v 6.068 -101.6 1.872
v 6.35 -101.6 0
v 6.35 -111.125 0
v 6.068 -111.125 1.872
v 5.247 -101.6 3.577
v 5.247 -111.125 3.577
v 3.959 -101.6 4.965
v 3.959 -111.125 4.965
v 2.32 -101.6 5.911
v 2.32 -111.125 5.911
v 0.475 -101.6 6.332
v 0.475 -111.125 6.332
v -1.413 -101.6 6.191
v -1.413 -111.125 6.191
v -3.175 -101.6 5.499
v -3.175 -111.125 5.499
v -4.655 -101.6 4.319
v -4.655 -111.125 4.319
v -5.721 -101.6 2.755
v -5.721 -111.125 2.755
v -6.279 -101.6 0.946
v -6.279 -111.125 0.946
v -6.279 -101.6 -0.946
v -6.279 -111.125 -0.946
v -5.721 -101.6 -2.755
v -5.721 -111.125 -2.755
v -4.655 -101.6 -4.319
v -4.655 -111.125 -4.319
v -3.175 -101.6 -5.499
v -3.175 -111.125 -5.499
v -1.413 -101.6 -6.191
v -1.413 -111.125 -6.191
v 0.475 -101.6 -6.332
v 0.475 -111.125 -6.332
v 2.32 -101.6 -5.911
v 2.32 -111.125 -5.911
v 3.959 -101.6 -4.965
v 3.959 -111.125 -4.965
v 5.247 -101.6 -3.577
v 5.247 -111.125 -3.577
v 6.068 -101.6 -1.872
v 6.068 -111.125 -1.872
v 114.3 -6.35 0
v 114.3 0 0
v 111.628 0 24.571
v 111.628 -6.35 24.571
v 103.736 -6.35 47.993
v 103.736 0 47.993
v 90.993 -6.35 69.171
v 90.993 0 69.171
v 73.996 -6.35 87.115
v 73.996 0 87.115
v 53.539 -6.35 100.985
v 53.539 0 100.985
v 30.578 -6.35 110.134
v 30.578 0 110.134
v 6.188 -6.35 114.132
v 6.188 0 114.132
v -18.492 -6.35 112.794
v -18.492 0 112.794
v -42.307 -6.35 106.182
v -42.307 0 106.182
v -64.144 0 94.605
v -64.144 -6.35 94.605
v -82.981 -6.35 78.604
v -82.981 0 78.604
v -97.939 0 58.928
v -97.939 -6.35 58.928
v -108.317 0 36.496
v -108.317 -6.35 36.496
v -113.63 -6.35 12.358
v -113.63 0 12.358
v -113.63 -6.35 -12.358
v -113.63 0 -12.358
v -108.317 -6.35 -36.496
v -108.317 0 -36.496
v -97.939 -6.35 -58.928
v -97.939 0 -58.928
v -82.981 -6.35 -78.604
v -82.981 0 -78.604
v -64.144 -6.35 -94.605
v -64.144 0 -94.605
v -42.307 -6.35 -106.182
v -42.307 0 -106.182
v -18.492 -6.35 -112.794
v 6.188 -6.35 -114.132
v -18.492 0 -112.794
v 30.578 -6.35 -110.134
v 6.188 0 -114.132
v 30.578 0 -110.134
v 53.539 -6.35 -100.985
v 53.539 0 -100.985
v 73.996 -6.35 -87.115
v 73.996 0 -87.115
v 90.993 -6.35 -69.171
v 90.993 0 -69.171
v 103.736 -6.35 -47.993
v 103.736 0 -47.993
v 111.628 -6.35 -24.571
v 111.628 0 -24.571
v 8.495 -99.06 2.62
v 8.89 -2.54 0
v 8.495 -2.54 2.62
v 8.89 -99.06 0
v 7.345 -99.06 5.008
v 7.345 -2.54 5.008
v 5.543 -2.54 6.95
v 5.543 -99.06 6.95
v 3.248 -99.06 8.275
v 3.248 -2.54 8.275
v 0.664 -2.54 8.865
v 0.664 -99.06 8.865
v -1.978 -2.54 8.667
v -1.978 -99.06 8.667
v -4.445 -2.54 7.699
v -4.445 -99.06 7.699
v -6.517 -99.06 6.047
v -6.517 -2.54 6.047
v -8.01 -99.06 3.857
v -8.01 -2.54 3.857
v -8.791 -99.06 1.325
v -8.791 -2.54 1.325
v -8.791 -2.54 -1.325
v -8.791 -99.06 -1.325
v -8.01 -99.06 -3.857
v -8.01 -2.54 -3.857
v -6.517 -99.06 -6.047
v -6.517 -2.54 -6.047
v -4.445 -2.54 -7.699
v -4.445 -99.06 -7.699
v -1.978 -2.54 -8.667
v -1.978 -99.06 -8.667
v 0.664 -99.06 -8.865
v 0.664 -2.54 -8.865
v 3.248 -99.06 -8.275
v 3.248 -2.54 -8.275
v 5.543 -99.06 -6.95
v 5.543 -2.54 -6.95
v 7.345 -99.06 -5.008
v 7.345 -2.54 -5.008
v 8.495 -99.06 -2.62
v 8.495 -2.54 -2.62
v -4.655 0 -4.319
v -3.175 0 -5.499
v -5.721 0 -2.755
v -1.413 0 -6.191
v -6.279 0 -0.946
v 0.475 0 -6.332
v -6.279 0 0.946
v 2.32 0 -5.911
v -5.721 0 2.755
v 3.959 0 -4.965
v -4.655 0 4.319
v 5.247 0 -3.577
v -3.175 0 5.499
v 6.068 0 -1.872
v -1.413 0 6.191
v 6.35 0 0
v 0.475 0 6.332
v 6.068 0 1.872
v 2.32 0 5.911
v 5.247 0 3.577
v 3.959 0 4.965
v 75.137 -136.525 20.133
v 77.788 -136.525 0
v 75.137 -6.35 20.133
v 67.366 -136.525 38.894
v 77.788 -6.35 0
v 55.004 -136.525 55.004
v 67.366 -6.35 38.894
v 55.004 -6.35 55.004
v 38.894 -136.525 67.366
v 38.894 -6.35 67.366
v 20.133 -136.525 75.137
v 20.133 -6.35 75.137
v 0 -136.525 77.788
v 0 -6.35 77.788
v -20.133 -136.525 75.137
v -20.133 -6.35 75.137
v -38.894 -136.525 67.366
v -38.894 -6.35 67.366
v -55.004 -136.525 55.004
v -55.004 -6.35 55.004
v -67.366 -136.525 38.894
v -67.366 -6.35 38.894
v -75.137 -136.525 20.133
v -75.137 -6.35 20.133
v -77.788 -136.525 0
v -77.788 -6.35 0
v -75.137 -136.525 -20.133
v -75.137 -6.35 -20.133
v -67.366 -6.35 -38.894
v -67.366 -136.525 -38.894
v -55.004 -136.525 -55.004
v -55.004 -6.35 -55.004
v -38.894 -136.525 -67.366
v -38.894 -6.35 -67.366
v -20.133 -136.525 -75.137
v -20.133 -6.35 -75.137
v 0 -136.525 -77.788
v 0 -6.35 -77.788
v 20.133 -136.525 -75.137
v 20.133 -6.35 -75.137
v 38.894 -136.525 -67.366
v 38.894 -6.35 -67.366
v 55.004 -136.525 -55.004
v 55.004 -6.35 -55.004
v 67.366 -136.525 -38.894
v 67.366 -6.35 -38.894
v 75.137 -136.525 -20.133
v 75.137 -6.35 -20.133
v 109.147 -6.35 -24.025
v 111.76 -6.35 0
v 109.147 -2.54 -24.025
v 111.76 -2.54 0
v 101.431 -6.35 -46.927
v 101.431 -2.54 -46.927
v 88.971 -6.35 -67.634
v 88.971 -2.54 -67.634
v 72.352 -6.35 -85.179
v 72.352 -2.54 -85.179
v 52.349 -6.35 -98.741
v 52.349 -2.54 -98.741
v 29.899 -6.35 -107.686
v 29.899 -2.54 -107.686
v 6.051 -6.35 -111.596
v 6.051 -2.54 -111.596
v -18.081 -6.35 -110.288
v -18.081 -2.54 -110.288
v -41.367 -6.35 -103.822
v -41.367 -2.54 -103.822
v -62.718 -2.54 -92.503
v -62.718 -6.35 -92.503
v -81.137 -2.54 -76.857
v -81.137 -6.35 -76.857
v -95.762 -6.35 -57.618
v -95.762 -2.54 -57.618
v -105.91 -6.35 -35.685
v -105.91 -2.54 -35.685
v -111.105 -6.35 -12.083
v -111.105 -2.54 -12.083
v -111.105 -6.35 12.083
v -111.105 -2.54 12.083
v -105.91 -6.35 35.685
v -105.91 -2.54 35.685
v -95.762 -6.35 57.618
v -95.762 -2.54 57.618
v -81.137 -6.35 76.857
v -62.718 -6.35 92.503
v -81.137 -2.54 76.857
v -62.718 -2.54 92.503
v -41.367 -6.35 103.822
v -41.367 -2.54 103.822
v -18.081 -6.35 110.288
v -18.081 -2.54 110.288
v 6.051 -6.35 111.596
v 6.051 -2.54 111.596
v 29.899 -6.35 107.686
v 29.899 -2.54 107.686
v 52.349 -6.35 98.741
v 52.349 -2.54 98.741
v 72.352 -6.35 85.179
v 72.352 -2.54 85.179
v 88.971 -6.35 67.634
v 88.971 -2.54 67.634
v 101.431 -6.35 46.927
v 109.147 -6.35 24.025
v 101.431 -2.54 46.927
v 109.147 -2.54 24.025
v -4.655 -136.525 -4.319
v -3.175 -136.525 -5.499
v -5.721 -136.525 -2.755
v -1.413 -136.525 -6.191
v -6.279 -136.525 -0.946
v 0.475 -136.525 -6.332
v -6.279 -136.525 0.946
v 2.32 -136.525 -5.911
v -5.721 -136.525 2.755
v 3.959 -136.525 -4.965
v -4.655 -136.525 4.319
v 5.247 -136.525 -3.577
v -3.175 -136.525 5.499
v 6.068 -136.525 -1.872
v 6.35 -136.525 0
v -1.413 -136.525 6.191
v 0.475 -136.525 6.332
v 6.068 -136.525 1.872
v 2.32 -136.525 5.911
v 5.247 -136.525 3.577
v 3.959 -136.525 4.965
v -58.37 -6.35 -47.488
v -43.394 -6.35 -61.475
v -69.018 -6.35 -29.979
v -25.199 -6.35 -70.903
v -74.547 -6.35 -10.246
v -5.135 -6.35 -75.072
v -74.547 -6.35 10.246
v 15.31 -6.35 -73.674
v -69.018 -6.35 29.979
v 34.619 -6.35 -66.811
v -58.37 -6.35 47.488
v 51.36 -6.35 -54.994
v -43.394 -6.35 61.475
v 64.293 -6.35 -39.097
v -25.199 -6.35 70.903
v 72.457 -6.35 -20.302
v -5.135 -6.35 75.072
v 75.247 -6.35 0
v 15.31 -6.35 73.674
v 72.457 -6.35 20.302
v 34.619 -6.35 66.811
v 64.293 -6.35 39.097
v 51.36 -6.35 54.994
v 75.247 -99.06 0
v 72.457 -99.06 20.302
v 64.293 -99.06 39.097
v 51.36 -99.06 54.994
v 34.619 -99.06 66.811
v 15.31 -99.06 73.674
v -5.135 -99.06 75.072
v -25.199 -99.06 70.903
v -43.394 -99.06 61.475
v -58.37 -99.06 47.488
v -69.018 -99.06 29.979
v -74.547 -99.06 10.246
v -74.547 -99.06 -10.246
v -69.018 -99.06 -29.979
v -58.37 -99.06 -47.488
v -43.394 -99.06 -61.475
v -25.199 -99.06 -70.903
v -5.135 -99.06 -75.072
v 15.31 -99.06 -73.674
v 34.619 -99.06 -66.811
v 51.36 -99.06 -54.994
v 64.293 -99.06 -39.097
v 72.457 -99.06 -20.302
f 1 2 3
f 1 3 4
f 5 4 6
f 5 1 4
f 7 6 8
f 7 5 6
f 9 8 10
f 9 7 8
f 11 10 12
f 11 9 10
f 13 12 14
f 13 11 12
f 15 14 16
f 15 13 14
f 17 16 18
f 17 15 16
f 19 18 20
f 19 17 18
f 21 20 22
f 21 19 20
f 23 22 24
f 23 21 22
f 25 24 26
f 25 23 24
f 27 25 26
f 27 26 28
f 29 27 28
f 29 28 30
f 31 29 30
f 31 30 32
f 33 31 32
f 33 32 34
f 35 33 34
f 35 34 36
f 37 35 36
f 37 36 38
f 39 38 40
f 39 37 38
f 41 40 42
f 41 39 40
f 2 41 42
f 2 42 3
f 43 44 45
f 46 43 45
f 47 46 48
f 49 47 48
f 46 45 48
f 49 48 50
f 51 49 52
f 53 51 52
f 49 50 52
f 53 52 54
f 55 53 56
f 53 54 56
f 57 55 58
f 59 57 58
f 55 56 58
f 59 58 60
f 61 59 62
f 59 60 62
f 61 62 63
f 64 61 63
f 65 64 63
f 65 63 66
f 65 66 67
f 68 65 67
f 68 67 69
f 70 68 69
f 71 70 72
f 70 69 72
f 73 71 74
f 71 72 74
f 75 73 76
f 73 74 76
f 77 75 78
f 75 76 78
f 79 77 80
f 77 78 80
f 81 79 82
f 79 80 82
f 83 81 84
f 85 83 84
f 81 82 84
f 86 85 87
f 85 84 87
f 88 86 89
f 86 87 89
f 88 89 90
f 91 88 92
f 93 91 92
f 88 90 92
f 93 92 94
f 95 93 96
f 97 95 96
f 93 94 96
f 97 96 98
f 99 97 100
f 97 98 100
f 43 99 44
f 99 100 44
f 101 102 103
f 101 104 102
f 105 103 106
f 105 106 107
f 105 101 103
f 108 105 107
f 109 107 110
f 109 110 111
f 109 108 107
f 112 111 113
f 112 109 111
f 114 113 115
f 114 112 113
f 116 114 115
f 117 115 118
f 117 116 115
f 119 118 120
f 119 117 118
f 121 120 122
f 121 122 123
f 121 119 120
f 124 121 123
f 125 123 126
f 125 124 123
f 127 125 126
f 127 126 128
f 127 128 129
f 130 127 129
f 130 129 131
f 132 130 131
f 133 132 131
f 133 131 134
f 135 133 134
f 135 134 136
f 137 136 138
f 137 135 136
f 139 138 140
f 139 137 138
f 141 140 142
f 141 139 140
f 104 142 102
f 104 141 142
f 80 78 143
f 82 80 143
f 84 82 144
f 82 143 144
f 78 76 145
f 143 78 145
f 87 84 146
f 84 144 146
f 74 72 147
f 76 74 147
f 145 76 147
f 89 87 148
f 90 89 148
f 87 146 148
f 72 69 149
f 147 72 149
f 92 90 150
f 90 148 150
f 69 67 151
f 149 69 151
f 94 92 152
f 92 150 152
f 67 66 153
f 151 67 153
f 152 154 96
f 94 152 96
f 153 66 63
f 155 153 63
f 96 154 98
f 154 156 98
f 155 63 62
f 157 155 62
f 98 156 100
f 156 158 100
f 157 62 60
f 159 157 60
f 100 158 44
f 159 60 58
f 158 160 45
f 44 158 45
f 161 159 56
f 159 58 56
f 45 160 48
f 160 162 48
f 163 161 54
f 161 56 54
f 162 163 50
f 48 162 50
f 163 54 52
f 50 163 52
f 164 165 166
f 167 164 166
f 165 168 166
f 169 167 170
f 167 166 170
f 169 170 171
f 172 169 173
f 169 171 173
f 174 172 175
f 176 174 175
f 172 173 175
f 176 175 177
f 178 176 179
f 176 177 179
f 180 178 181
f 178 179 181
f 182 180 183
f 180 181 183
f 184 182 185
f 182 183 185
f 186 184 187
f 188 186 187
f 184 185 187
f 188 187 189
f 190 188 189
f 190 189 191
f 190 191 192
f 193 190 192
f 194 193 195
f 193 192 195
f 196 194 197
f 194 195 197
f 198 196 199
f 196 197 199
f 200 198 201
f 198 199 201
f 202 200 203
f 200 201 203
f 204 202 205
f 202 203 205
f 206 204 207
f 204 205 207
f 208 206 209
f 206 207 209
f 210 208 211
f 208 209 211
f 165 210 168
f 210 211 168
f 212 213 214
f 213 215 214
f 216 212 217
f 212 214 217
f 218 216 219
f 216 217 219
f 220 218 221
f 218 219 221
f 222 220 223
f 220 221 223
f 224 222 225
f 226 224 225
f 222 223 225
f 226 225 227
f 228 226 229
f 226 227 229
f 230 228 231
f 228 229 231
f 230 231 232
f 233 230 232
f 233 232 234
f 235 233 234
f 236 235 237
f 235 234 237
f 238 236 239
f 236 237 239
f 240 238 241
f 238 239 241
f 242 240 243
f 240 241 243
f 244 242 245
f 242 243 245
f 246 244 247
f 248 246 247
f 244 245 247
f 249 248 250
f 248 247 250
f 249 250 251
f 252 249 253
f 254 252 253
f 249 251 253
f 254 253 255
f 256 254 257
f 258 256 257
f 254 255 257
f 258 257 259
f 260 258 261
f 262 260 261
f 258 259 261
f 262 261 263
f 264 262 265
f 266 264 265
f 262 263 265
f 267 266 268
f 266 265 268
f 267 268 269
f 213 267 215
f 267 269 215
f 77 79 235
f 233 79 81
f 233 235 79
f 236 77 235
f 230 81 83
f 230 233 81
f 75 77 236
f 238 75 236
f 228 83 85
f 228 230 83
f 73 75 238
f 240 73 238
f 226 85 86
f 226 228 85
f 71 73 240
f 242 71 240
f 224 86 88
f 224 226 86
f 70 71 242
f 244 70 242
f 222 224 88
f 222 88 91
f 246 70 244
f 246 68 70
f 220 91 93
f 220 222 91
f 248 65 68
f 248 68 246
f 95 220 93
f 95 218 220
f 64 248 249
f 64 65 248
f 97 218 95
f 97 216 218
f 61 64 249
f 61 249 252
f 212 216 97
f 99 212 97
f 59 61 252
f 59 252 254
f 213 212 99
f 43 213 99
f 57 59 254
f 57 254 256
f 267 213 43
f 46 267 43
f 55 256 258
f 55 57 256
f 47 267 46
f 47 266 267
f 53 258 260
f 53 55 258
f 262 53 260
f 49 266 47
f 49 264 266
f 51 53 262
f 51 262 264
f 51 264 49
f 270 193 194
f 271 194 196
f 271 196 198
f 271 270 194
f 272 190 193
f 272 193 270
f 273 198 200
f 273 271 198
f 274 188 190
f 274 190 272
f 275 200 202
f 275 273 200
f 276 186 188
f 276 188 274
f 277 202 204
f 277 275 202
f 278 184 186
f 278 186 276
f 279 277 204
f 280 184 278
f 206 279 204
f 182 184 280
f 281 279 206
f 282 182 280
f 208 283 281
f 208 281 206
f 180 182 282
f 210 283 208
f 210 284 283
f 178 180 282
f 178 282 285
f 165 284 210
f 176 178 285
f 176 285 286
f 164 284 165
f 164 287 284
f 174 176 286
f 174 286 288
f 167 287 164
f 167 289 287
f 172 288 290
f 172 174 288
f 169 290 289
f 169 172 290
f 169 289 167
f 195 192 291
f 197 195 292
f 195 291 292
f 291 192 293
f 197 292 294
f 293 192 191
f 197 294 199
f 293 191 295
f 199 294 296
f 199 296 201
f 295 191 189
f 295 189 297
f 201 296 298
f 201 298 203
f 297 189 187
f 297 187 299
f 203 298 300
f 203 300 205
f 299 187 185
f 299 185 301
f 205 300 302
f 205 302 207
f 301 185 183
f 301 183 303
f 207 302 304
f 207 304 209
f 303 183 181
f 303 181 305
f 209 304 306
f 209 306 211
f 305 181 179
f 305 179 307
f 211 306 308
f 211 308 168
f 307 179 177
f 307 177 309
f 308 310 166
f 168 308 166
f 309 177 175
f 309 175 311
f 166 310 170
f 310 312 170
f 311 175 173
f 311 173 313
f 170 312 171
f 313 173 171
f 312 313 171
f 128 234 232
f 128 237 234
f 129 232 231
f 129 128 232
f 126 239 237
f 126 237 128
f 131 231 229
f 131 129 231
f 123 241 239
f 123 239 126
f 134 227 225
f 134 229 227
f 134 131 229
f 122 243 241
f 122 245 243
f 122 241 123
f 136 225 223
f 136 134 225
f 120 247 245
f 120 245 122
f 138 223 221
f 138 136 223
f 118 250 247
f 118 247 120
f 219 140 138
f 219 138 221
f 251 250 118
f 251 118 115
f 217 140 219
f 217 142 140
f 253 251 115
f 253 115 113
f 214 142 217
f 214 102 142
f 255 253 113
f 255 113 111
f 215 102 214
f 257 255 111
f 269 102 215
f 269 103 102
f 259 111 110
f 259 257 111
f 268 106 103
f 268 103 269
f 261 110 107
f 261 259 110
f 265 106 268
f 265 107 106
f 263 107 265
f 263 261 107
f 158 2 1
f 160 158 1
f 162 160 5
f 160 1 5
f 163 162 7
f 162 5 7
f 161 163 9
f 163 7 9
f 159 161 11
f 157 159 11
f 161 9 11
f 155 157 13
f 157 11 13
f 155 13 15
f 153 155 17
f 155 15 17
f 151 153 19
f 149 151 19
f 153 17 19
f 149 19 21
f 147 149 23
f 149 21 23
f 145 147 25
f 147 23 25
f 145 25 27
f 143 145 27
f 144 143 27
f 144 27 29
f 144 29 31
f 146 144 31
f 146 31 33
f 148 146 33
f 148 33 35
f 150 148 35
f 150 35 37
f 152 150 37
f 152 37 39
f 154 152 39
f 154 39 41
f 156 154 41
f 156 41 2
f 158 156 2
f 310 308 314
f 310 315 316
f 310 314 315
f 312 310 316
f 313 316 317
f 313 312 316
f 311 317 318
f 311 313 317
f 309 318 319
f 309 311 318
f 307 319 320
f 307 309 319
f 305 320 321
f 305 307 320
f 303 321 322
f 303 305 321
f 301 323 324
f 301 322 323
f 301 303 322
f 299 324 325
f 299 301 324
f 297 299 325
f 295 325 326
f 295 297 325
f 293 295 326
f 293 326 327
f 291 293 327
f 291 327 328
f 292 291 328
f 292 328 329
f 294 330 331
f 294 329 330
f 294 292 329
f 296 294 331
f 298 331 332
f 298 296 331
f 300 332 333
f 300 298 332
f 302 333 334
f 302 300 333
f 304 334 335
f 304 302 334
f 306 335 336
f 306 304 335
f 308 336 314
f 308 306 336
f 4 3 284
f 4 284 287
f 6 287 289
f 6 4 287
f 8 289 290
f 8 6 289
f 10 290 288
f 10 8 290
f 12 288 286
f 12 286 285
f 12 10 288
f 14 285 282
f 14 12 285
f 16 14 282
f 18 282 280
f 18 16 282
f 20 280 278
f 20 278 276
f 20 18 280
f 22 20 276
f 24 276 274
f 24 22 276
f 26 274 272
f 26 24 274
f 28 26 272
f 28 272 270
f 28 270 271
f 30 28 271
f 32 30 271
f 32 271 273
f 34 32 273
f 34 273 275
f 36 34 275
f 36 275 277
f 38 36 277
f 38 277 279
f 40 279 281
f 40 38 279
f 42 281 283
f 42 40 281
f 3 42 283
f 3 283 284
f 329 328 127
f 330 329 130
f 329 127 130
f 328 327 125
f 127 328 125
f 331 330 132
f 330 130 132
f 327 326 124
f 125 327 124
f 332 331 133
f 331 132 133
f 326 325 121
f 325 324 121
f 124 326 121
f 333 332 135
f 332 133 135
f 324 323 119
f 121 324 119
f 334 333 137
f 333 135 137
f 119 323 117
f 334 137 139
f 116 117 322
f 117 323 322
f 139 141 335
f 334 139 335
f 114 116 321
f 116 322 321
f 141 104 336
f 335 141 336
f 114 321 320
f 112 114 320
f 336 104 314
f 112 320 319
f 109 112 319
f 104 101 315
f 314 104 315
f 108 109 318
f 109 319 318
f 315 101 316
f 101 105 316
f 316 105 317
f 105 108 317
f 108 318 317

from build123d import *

# Parameters (mm, degrees)
F0_R     = 114.3
F0_R_2   = 77.7875
F1_DEPTH = 6.35
F2_DEPTH = 203.2
F3_DEPTH = 101.6
F4_R     = 6.35
F5_DEPTH = 101.601
F6_T     = -2.54
F7_DEPTH = 9.525
F8_DEPTH = 25.4


# Not quite as in the source:
# - a shell that OpenCascade refuses in one call is made with other operations: the cavity is built on its own and cut out


with BuildPart() as f1:
    # F0 (on Front) → F1 (new body)
    with BuildSketch(Plane.XZ):
        Circle(F0_R)
        Circle(F0_R_2, mode=Mode.SUBTRACT)
    extrude(amount=F1_DEPTH)

    # F0 (on Front) → F2 (join)
    with BuildSketch(Plane.XZ):
        Circle(F0_R_2)
    extrude(amount=F2_DEPTH)

    # F3 (cut): a face of the model
    f3_faces = [f1.faces().sort_by_distance(p)[0] for p in [
        (0, -203.2, 0),
    ]]
    extrude(f3_faces, amount=-F3_DEPTH, mode=Mode.SUBTRACT)

    # F4 (on face) → F5 (cut, through all)
    with BuildSketch(Plane.XZ.offset(101.6)):
        Circle(F4_R)
    extrude(amount=-F5_DEPTH, mode=Mode.SUBTRACT)

    # F6: a shell. OpenCascade refuses it in one call, so the cavity is built on its own and cut out:
    # the body offset inwards by the wall thickness, plus a prism from it out through each open face.
    f6_core = offset(f1.part, amount=F6_T, kind=Kind.INTERSECTION, mode=Mode.PRIVATE)
    f6_exits = [f6_core.faces().sort_by_distance(p)[0] for p in [
        (-78.40855, -3.81, 0),
    ]]
    add(f6_core, mode=Mode.SUBTRACT)
    extrude(f6_exits, amount=-F6_T, mode=Mode.SUBTRACT)

    # F7 (add): a face of the model
    f7_faces = [f1.faces().sort_by_distance(p)[0] for p in [
        (-75.5873372503, -101.6, 0),
    ]]
    extrude(f7_faces, amount=F7_DEPTH)

    # F8 (add): a face of the model
    f8_faces = [f1.faces().sort_by_distance(p)[0] for p in [
        (-75.5873372503, -111.125, 0),
    ]]
    extrude(f8_faces, amount=F8_DEPTH)


solid = f1.part
